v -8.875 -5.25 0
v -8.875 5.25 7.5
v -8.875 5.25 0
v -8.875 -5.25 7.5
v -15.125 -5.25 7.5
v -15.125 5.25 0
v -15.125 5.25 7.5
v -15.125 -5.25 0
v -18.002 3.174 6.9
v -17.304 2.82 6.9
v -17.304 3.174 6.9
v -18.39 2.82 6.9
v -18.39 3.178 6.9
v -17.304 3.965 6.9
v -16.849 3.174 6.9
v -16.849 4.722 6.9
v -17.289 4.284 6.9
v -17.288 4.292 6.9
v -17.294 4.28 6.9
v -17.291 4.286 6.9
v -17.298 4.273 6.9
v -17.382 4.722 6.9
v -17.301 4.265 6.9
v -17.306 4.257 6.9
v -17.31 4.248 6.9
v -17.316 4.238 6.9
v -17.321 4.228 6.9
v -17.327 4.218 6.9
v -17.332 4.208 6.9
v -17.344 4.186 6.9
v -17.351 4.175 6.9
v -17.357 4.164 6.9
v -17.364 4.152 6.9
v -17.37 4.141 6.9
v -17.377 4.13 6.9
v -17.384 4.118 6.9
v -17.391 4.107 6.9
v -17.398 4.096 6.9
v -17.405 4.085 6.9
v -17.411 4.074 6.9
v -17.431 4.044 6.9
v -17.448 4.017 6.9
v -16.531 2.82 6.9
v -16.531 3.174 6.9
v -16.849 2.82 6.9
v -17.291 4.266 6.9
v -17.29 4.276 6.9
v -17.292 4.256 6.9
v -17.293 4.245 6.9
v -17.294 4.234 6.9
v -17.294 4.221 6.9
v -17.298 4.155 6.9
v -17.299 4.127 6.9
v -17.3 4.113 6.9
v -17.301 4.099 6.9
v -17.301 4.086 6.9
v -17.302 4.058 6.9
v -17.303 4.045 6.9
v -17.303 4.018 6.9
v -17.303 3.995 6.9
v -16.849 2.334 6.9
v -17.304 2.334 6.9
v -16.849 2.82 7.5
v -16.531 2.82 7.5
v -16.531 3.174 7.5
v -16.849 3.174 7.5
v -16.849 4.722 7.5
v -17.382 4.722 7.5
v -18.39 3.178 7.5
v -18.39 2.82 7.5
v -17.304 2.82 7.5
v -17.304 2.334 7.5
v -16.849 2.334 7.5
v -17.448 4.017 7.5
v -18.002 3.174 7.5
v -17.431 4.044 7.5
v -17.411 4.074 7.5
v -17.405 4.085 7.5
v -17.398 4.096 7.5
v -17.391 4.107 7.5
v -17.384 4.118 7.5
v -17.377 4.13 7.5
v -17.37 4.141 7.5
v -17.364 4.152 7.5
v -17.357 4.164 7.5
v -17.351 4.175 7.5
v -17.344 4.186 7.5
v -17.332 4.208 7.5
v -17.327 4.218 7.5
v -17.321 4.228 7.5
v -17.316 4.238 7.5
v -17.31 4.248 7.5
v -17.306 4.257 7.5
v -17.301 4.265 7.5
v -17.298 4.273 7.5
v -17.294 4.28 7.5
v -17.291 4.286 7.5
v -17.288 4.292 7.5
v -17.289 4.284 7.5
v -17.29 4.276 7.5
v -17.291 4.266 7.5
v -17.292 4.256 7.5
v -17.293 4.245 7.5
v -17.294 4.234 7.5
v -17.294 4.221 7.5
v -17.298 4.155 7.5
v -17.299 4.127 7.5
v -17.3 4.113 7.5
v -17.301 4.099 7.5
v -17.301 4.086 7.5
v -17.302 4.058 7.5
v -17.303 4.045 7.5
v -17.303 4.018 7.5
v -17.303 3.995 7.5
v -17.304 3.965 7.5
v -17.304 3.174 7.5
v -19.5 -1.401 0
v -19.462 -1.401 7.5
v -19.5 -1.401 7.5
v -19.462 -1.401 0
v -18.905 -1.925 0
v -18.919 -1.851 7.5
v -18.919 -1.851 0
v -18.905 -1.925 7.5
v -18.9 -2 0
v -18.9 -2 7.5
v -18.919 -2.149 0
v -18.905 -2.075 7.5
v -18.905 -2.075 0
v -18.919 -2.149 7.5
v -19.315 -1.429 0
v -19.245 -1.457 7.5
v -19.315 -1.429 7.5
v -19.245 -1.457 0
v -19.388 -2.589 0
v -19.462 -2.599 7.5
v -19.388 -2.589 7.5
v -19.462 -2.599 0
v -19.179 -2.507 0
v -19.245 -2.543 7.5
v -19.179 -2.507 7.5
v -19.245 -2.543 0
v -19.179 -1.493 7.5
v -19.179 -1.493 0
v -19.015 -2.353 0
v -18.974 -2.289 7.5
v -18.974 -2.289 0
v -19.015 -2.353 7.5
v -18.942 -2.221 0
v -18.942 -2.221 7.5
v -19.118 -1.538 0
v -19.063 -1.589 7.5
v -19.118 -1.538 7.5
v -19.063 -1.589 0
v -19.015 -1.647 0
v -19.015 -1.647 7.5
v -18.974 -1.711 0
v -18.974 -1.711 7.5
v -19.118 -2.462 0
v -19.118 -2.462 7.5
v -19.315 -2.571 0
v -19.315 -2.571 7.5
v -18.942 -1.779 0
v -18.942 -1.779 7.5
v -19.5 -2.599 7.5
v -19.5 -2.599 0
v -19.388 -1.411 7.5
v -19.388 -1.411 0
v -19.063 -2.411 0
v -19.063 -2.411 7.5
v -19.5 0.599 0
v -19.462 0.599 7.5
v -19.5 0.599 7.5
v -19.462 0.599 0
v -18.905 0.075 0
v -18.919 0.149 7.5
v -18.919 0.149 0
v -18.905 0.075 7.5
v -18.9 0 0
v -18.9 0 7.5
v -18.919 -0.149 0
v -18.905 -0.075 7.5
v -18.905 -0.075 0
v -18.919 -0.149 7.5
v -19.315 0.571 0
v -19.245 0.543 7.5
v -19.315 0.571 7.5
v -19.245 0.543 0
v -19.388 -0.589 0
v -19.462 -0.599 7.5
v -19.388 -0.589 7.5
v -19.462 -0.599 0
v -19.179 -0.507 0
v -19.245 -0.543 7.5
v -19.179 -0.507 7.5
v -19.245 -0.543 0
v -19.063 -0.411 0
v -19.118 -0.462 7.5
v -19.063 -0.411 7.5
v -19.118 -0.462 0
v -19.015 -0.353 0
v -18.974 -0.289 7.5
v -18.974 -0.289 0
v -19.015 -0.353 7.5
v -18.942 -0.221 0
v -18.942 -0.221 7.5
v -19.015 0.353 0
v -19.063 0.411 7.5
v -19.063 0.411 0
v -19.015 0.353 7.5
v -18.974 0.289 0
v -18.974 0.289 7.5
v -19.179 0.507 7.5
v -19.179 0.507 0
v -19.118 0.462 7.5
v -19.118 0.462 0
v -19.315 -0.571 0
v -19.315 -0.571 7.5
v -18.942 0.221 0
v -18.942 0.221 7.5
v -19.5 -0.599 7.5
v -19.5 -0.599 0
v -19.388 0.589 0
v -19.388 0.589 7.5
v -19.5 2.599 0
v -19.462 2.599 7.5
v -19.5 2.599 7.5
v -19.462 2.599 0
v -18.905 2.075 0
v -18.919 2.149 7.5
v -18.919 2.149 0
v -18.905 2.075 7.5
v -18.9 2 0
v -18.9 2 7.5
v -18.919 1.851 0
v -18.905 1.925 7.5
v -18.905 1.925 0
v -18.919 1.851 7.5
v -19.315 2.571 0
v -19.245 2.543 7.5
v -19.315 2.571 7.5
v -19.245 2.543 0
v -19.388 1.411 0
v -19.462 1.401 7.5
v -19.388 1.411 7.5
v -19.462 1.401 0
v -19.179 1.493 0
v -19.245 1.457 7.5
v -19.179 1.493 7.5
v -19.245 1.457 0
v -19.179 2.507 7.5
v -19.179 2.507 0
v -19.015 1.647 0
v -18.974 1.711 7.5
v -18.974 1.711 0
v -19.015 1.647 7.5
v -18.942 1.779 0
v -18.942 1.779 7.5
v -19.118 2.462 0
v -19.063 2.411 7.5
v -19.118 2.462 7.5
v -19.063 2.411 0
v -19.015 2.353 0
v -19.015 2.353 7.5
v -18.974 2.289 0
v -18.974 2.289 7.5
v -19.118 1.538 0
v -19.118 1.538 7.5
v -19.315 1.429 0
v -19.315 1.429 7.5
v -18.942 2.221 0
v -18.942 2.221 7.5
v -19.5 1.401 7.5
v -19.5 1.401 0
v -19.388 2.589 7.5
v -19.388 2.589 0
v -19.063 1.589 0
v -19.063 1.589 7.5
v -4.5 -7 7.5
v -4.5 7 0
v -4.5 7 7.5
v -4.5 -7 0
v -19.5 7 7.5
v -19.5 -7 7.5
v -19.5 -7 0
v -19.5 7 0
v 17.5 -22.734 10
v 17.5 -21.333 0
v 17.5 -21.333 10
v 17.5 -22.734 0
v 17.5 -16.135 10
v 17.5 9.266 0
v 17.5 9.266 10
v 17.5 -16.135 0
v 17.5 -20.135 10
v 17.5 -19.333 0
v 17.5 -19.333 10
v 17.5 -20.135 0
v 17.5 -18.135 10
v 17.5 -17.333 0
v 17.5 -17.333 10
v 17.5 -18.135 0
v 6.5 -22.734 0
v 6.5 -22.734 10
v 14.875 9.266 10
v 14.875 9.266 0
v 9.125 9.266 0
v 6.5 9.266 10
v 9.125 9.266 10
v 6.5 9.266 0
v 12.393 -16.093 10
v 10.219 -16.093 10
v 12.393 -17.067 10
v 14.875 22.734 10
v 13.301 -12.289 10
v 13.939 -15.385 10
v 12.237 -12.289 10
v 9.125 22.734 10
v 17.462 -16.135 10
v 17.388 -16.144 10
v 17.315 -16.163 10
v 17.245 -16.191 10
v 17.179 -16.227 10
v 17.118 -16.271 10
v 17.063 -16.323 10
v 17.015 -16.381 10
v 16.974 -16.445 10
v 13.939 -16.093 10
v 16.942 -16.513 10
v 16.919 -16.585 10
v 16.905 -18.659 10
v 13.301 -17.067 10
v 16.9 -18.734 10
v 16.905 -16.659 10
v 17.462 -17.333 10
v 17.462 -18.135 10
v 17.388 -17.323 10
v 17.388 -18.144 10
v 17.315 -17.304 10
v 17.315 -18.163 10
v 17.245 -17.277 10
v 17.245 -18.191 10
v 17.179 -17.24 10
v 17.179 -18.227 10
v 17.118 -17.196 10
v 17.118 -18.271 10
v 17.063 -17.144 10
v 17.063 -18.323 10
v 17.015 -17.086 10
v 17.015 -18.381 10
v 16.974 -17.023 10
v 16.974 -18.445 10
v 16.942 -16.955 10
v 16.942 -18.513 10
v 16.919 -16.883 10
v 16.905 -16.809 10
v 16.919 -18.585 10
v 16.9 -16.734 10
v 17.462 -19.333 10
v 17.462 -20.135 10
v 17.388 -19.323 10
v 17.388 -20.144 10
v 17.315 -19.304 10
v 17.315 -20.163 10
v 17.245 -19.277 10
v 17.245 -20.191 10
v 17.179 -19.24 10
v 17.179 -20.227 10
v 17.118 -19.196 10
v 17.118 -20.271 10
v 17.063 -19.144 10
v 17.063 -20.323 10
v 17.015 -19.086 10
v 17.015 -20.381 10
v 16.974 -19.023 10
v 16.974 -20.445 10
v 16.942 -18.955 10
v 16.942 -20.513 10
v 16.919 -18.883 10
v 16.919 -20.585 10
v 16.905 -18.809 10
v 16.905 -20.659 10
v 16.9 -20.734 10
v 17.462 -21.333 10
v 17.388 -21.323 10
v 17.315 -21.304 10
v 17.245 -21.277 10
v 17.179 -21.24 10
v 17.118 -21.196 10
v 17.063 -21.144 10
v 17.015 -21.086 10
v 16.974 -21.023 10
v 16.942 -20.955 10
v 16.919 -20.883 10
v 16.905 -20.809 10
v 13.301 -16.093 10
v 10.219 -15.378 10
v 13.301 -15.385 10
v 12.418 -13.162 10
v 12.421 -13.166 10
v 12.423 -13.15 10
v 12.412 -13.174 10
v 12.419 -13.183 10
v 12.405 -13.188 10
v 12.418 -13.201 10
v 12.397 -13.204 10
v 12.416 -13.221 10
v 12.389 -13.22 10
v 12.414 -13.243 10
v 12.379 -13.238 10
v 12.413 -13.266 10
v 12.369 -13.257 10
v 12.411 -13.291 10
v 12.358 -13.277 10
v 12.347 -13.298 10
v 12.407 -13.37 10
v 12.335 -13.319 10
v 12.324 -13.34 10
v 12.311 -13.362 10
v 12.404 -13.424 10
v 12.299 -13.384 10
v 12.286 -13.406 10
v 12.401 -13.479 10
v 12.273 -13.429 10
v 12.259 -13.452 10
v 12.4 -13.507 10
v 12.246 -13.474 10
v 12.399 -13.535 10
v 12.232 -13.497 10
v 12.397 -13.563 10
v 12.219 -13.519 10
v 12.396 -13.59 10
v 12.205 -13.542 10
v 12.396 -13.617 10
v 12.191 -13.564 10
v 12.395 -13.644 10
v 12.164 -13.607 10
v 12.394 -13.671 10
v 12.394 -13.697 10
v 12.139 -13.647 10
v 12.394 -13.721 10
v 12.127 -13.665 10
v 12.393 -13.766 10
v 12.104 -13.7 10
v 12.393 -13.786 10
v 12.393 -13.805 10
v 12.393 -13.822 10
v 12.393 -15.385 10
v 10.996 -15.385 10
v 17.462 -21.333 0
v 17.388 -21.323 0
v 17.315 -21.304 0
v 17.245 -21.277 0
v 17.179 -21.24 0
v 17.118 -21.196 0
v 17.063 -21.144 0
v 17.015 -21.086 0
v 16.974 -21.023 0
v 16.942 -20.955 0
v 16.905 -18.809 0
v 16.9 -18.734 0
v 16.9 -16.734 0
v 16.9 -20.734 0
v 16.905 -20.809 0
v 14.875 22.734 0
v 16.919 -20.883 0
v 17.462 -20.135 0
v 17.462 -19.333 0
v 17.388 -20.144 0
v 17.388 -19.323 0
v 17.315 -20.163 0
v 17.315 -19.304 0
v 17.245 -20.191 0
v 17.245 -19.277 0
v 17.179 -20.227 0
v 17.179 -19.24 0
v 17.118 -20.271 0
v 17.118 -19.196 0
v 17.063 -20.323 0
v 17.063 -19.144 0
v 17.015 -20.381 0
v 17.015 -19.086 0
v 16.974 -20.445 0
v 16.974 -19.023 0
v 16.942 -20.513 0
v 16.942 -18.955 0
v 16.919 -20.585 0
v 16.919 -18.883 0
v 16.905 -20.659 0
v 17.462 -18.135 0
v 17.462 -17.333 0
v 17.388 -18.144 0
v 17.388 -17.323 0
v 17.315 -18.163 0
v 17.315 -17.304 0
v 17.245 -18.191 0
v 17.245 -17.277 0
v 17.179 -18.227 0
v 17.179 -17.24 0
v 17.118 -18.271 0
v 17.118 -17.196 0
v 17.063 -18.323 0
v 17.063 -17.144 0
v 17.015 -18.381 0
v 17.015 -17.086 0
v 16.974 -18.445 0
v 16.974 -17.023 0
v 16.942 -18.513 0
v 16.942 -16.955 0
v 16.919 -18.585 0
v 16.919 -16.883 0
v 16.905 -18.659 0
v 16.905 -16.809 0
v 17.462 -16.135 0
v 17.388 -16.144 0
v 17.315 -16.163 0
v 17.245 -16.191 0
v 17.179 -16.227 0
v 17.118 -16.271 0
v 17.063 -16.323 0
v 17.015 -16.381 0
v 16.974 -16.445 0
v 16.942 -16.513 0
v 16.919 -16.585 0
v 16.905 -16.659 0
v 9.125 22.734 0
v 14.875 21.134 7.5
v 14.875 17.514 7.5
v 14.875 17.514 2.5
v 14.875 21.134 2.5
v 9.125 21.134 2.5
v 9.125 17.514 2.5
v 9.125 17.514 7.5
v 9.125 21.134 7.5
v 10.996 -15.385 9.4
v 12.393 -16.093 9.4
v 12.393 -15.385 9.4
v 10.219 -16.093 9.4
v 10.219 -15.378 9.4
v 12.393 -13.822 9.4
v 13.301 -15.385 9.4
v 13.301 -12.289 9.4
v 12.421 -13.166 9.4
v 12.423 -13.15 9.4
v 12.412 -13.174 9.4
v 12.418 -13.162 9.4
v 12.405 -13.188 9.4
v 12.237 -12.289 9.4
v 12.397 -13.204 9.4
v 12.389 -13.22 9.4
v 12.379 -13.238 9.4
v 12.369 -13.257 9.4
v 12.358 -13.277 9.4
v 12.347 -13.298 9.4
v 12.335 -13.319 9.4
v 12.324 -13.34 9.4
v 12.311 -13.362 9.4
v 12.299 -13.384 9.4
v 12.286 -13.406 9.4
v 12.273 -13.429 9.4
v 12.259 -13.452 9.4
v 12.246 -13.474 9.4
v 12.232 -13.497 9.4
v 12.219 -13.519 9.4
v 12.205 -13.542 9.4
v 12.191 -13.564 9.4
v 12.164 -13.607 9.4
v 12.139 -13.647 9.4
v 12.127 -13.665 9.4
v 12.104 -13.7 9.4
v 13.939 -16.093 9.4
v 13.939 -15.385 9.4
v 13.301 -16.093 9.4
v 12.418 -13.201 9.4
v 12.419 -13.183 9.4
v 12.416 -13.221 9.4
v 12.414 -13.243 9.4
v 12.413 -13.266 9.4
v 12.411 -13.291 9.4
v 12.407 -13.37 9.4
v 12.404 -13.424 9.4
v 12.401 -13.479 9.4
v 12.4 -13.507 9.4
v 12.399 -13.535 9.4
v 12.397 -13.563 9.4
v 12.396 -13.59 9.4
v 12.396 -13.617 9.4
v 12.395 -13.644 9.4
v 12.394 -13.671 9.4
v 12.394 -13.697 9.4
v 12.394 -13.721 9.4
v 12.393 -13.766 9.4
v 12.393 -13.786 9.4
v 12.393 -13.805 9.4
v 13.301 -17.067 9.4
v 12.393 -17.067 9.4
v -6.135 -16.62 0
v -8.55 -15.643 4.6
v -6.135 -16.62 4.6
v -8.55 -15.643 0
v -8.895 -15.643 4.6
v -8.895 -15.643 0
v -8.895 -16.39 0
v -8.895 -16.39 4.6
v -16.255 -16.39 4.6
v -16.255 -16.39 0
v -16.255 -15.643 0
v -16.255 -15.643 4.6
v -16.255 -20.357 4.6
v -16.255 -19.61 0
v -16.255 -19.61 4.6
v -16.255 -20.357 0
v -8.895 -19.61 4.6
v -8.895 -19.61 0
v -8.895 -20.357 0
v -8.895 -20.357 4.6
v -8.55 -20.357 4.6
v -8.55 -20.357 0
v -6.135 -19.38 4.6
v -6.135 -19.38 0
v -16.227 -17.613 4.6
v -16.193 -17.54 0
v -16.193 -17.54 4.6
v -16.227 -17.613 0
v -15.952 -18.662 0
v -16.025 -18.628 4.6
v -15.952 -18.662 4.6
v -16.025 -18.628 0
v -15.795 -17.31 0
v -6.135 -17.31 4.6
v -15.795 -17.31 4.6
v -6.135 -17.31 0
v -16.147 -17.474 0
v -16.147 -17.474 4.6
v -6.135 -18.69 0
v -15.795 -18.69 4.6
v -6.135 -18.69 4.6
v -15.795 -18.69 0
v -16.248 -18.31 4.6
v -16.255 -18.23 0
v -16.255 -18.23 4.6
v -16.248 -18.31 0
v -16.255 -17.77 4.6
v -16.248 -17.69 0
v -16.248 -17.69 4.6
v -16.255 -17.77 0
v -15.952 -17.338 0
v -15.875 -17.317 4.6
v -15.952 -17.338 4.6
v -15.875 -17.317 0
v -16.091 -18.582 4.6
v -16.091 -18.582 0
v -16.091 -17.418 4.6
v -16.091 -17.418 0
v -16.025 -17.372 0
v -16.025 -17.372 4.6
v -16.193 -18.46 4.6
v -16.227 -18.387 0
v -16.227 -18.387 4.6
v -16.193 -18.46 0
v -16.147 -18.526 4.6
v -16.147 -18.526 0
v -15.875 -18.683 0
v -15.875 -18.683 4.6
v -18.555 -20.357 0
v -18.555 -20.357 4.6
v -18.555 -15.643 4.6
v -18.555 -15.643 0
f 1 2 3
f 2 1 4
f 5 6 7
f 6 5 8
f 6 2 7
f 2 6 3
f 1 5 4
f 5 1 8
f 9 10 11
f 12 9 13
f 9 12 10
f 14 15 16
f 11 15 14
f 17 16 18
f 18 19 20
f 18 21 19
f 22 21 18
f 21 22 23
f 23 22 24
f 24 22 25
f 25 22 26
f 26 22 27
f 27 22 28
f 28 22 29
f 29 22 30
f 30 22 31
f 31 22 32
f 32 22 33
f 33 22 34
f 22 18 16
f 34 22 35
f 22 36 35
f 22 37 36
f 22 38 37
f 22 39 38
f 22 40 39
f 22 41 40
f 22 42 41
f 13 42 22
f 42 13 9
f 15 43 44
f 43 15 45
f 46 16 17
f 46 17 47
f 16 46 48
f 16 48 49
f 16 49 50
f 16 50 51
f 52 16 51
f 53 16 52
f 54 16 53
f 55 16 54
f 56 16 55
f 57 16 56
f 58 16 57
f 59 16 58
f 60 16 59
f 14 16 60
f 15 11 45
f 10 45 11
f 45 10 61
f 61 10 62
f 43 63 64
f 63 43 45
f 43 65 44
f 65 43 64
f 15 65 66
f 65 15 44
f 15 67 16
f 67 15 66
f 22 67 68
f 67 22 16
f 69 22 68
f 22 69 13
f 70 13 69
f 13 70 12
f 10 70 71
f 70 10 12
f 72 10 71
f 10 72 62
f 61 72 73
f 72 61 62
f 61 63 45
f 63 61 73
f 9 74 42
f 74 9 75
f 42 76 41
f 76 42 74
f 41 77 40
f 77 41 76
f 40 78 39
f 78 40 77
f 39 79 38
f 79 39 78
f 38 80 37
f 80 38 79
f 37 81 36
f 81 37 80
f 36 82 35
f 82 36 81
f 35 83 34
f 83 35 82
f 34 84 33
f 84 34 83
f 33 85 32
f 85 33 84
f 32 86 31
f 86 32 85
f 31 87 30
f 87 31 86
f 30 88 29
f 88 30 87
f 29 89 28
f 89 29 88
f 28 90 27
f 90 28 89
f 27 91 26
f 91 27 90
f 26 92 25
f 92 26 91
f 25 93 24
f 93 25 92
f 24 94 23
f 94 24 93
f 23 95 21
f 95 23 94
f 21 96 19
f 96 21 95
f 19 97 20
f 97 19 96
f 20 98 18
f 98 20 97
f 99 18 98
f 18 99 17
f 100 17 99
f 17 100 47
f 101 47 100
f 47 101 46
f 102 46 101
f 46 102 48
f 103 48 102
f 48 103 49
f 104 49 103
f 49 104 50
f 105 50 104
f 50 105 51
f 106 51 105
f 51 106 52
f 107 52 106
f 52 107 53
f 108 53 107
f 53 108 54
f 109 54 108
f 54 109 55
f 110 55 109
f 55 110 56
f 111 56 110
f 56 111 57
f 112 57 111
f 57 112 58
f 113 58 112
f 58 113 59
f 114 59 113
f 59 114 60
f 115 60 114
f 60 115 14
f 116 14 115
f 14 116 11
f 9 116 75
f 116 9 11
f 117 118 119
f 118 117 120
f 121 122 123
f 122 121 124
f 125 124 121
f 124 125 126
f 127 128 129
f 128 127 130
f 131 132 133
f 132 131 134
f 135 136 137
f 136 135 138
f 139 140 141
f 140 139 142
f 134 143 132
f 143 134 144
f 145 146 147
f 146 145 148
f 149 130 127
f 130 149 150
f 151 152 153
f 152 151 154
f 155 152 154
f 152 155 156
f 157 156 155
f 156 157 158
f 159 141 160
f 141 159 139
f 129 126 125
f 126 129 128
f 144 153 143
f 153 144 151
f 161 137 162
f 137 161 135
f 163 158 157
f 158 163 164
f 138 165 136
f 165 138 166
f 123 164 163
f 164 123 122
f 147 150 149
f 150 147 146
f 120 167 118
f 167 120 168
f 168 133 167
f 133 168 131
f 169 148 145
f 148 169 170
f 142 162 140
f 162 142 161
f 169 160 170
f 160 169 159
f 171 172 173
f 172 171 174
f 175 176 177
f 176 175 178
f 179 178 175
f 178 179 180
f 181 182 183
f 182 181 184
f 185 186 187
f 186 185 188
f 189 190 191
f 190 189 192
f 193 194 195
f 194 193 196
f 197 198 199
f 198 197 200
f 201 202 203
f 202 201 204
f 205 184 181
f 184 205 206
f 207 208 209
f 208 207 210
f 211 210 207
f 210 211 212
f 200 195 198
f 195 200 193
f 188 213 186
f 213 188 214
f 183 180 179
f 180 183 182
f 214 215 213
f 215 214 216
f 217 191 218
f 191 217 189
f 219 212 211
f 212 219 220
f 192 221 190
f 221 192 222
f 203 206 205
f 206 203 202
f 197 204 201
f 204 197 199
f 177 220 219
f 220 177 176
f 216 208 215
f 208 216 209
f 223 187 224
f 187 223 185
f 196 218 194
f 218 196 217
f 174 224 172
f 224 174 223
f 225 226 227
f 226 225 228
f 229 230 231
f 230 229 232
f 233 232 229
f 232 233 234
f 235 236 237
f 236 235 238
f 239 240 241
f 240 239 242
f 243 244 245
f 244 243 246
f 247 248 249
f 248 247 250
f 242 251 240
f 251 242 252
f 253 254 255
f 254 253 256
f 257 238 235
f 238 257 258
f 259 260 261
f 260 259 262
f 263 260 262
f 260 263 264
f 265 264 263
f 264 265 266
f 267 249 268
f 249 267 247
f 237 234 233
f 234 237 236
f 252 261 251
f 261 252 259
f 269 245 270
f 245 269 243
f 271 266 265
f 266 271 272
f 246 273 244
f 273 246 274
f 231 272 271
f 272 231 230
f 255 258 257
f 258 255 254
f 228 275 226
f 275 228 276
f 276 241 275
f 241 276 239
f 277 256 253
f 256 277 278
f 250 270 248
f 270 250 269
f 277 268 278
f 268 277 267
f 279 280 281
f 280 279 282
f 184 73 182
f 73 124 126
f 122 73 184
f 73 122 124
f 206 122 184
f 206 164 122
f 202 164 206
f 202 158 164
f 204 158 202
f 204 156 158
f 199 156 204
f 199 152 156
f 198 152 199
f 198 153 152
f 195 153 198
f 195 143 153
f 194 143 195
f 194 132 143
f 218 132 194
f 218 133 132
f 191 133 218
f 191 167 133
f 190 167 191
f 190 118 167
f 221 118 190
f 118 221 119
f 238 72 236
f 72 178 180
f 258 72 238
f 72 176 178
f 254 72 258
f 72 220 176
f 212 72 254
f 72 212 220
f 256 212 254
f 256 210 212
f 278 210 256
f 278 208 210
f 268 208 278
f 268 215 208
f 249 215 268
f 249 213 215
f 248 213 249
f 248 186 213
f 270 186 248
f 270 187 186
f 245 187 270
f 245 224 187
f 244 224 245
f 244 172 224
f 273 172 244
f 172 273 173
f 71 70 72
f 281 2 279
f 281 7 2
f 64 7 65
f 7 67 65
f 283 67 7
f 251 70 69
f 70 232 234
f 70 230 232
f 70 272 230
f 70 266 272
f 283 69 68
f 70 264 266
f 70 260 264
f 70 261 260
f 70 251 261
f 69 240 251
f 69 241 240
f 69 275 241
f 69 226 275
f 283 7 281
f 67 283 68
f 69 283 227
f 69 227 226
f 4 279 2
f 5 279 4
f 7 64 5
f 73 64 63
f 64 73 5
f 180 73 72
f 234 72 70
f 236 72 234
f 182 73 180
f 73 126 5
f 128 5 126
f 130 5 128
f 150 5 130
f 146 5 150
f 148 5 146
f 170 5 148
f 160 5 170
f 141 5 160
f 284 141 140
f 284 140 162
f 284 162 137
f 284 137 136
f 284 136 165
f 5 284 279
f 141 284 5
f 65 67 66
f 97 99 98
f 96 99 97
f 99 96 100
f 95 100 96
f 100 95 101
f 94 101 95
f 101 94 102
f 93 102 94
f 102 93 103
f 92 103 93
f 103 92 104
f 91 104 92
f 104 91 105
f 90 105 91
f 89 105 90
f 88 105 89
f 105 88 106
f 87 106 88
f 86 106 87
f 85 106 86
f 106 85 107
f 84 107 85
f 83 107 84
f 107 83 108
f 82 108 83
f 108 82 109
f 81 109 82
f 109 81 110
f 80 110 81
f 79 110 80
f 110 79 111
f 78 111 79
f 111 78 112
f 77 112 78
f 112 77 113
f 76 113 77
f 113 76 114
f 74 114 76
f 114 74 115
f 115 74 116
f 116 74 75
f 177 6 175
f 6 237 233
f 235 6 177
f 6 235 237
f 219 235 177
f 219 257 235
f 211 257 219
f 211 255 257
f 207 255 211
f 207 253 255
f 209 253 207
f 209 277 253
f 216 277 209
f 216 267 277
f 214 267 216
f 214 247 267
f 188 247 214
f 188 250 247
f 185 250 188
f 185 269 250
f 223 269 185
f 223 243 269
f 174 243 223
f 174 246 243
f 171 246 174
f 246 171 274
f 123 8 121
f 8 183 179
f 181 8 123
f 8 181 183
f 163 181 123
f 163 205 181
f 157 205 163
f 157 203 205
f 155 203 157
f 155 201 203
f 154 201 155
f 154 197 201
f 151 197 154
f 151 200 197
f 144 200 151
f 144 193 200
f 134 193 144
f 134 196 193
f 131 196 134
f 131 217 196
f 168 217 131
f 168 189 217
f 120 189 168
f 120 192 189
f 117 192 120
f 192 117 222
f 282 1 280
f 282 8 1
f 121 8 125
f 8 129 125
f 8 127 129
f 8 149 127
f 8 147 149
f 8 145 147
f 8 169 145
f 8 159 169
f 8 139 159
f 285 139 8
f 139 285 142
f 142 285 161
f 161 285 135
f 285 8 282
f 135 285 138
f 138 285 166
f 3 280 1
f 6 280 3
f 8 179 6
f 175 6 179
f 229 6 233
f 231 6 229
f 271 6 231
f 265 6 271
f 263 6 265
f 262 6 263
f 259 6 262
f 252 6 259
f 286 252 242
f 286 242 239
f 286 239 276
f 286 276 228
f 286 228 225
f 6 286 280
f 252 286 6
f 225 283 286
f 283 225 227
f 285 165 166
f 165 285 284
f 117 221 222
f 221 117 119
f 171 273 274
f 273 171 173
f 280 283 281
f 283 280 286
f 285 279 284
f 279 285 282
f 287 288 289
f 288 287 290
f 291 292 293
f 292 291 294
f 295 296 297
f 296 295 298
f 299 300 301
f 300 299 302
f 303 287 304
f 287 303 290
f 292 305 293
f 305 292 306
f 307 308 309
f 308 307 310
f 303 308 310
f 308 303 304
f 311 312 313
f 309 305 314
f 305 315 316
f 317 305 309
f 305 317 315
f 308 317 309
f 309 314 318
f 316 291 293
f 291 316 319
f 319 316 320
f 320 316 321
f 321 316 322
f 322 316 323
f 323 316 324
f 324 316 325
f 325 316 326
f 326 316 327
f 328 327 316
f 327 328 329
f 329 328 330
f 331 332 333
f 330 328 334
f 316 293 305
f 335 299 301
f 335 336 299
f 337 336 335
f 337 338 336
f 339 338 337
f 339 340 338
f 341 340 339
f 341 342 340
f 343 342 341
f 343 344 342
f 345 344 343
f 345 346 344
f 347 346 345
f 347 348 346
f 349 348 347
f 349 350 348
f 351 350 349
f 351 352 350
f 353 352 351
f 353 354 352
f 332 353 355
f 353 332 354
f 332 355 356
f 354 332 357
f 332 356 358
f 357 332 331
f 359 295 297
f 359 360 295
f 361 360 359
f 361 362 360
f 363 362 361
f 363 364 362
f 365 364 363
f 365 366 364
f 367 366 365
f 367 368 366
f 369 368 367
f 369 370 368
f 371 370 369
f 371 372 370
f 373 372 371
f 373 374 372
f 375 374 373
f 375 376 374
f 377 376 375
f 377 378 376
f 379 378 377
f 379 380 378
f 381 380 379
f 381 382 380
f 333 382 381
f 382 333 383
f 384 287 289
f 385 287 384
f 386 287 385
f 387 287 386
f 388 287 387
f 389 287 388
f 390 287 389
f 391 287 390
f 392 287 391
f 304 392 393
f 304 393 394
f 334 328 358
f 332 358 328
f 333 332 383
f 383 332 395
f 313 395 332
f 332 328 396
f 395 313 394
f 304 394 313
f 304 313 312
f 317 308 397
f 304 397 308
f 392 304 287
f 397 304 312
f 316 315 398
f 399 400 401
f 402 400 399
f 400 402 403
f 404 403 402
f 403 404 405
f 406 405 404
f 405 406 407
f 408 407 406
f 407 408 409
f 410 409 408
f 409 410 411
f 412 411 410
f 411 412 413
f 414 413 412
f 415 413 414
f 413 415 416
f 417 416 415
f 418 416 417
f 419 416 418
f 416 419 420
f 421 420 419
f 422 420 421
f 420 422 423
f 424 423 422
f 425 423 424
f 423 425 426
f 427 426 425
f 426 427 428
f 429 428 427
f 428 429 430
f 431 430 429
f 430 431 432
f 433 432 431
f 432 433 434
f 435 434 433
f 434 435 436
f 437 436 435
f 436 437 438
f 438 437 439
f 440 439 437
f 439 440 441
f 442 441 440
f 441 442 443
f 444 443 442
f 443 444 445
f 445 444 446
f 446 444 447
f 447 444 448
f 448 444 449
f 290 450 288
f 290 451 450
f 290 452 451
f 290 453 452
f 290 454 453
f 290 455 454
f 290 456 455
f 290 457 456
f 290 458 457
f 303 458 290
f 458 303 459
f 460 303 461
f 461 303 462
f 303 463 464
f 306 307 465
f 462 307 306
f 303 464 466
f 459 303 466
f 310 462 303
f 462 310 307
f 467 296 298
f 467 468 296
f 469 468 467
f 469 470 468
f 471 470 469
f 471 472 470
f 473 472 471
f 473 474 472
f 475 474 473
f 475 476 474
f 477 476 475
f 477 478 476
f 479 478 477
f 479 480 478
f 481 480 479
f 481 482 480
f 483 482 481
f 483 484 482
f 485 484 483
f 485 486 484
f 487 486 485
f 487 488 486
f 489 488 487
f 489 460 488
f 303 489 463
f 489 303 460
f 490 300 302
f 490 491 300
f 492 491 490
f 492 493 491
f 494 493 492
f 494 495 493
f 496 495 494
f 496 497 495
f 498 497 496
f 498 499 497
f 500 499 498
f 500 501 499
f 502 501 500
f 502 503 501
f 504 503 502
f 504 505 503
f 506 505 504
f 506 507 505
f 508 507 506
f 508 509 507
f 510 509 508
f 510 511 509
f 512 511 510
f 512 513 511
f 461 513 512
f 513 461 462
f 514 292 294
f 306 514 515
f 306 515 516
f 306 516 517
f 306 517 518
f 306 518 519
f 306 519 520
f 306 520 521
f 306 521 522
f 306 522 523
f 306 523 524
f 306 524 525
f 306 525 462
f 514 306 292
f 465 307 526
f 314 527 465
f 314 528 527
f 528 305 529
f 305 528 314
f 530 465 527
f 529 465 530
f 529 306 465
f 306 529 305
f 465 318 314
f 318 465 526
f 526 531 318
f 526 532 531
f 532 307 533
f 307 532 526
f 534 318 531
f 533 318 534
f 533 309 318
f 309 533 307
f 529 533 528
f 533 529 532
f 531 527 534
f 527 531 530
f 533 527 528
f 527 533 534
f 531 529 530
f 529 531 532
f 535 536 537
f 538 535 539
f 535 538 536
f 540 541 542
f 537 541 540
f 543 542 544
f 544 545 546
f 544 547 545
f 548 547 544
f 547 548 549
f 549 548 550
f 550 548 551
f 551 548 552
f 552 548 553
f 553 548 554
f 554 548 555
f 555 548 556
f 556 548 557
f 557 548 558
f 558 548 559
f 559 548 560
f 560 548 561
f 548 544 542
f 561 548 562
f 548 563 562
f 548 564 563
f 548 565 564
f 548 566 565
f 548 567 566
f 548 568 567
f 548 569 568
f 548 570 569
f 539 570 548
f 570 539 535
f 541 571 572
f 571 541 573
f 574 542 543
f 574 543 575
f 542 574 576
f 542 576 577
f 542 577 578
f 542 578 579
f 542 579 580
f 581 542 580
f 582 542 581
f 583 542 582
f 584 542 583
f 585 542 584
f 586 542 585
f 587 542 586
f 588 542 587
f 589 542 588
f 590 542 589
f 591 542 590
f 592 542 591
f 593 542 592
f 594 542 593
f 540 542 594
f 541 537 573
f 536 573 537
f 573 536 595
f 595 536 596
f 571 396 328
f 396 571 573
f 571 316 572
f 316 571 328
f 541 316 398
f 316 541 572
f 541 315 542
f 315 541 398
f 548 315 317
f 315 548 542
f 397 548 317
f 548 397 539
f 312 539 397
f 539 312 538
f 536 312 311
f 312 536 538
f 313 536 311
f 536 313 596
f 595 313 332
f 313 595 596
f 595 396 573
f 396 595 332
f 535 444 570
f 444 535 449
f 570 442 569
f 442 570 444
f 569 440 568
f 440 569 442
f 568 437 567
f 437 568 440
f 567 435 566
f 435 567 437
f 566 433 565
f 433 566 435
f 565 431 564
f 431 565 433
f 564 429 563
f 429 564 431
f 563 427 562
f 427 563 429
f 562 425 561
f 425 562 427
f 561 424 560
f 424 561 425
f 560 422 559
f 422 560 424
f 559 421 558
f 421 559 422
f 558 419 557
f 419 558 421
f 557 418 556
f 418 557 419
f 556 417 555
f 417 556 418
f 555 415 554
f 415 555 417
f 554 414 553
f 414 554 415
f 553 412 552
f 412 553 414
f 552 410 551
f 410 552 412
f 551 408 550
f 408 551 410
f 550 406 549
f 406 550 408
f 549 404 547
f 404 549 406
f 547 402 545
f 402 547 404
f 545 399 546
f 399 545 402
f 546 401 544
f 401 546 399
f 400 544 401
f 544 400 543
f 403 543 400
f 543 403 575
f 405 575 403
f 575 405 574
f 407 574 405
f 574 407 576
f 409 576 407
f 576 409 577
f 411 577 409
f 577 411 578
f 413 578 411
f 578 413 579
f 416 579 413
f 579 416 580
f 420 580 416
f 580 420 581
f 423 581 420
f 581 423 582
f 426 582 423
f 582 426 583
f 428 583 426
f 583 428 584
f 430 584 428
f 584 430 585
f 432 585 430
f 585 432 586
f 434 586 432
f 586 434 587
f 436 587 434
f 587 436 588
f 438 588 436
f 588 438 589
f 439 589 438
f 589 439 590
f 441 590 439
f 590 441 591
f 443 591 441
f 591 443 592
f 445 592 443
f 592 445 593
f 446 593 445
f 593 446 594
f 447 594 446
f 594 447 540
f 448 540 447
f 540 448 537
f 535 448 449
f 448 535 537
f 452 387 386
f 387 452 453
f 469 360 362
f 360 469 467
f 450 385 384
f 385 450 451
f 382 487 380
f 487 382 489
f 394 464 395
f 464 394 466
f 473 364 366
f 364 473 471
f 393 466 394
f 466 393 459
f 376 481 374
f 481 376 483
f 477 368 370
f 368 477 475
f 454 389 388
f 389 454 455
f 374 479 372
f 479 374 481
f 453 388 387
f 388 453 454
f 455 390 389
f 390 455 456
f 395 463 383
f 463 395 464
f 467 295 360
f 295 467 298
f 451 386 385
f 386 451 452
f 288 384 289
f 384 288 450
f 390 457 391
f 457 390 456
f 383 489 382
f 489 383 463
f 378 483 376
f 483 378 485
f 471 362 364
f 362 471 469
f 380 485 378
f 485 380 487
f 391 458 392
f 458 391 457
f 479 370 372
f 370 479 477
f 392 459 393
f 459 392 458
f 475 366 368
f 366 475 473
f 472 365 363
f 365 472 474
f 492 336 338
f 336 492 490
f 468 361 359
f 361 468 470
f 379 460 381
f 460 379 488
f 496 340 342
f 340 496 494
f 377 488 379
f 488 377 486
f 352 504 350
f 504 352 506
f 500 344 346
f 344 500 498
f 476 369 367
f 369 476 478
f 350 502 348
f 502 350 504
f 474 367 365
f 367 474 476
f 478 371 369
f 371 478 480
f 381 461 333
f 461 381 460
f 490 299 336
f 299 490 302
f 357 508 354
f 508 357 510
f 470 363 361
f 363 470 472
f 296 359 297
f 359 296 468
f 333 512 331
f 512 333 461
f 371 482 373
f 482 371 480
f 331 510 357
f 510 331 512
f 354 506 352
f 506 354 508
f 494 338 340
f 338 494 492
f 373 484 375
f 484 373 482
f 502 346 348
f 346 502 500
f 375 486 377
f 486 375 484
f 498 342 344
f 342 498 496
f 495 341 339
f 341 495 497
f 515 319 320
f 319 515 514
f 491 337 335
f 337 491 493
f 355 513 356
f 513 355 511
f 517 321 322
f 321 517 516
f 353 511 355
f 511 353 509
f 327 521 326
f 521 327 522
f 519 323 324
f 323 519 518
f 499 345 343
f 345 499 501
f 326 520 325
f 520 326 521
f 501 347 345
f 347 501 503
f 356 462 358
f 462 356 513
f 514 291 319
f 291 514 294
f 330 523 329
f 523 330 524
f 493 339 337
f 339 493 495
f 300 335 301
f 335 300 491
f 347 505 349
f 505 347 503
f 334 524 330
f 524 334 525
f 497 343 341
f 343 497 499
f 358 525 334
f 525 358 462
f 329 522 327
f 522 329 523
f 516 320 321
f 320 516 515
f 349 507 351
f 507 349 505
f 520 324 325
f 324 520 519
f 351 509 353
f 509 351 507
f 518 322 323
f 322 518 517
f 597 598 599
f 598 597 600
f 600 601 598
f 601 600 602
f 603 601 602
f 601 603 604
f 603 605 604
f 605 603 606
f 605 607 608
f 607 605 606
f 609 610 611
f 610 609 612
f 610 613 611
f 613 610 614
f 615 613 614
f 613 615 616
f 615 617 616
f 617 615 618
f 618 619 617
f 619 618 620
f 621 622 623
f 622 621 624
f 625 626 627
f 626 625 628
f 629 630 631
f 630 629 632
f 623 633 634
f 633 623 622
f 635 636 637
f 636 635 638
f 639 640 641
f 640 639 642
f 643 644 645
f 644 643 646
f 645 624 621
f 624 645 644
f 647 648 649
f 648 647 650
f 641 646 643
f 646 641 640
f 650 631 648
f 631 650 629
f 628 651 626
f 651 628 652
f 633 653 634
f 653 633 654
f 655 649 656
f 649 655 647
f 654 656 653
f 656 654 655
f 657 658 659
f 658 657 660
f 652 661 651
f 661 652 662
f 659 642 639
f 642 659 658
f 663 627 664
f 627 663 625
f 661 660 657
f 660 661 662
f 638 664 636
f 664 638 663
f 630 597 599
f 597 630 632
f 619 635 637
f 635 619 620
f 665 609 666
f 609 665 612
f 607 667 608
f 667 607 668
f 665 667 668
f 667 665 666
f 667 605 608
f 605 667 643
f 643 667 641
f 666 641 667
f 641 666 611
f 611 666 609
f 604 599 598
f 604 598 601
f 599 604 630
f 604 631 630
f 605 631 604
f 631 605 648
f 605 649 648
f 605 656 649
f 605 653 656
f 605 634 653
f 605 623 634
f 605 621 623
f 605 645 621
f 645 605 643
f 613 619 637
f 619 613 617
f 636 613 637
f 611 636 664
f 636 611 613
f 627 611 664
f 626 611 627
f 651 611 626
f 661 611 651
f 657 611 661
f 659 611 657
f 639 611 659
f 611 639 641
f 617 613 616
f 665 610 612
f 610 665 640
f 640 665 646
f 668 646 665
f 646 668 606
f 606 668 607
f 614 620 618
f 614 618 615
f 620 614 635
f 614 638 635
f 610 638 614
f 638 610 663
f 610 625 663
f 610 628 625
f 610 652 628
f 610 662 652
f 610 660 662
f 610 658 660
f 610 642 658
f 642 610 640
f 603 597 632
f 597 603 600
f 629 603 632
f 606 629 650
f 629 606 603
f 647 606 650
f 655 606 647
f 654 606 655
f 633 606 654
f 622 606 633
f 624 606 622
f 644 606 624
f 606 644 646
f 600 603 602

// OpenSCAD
$fn = 50;

difference() {
	union() {
		translate(v = [-12, -5, 0]) {
			rotate(a = [0, 0, 0]) {
				difference() {
					union() {
						translate(v = [-7.5, -2.0, 0]) {
							cube(size = [15.0, 14.0, 7.5]);
						}
					}
					union() {
						translate(v = [-3.125, -0.25, -0.1]) {
							cube(size = [6.25, 10.5, 7.7]);
						}
						translate(v = [-5.5, 8.5, 6.9]) {
							linear_extrude(height = 0.7) {
								text(font = "Arial:style=Bold", halign = "center", size = 2.5, text = "4", valign = "center");
							}
						}
						translate(v = [-7.5, 3, -0.1]) {
							cylinder(h = 7.7, r = 0.6);
						}
						translate(v = [-7.5, 5, -0.1]) {
							cylinder(h = 7.7, r = 0.6);
						}
						translate(v = [-7.5, 7, -0.1]) {
							cylinder(h = 7.7, r = 0.6);
						}
					}
				}
			}
		}
		translate(v = [12, 9.266250000000001, 0]) {
			rotate(a = [90, 0, 0]) {
				difference() {
					union() {
						translate(v = [-5.5, 0, 0]) {
							cube(size = [11.0, 10.0, 32.0]);
						}
						translate(v = [-2.875, 0, -13.467499999999998]) {
							cube(size = [5.75, 10.0, 13.567499999999997]);
						}
					}
					union() {
						translate(v = [-2.975, 2.5, -11.867499999999998]) {
							cube(size = [5.95, 5.0, 3.62]);
						}
						translate(v = [0, 9.4, 24.0]) {
							rotate(a = [-90, 0, 0]) {
								linear_extrude(height = 0.7) {
									text(font = "Arial:style=Bold", halign = "center", size = 5.0, text = "4", valign = "center");
								}
							}
						}
						translate(v = [5.5, 10.1, 30.0]) {
							rotate(a = [90, 0, 0]) {
								cylinder(h = 10.2, r = 0.6);
							}
						}
						translate(v = [5.5, 10.1, 28.0]) {
							rotate(a = [90, 0, 0]) {
								cylinder(h = 10.2, r = 0.6);
							}
						}
						translate(v = [5.5, 10.1, 26.0]) {
							rotate(a = [90, 0, 0]) {
								cylinder(h = 10.2, r = 0.6);
							}
						}
					}
				}
			}
		}
		translate(v = [-12, -18, 0]) {
			rotate(a = [90, 0, 0]) {
				difference() {
					union() {
						translate(v = [-6.555, 0, -2.3575]) {
							cube(size = [12.42, 4.6, 4.715]);
						}
					}
					union() {
						translate(v = [0, 4.699999999999999, 0]) {
							rotate(a = [90, 0, 0]) {
								linear_extrude(height = 4.8) {
									polygon(points = [[-4.255, -1.61], [3.105, -1.61], [3.105, -2.3575], [3.45, -2.3575], [5.865, -1.38], [5.965, -1.38], [5.965, -2.4575], [-4.255, -2.4575]]);
								}
							}
						}
						translate(v = [0, 4.699999999999999, 0]) {
							rotate(a = [90, 0, 0]) {
								linear_extrude(height = 4.8) {
									polygon(points = [[-4.255, 1.61], [3.105, 1.61], [3.105, 2.3575], [3.45, 2.3575], [5.865, 1.38], [5.965, 1.38], [5.965, 2.4575], [-4.255, 2.4575]]);
								}
							}
						}
						translate(v = [0, 4.699999999999999, 0]) {
							rotate(a = [90, 0, 0]) {
								linear_extrude(height = 4.8) {
									polygon(points = [[-4.255, 0.23], [-4.248012, 0.309878], [-4.227259, 0.387329], [-4.193372, 0.46], [-4.14738, 0.525682], [-4.090682, 0.58238], [-4.025, 0.628372], [-3.952329, 0.662259], [-3.874878, 0.683012], [-3.795, 0.69], [5.965, 0.69], [5.965, -0.69], [-3.795, -0.69], [-3.874878, -0.683012], [-3.952329, -0.662259], [-4.025, -0.628372], [-4.090682, -0.58238], [-4.14738, -0.525682], [-4.193372, -0.46], [-4.227259, -0.387329], [-4.248012, -0.309878], [-4.255, -0.23]]);
								}
							}
						}
					}
				}
			}
		}
	}
	union();
}
